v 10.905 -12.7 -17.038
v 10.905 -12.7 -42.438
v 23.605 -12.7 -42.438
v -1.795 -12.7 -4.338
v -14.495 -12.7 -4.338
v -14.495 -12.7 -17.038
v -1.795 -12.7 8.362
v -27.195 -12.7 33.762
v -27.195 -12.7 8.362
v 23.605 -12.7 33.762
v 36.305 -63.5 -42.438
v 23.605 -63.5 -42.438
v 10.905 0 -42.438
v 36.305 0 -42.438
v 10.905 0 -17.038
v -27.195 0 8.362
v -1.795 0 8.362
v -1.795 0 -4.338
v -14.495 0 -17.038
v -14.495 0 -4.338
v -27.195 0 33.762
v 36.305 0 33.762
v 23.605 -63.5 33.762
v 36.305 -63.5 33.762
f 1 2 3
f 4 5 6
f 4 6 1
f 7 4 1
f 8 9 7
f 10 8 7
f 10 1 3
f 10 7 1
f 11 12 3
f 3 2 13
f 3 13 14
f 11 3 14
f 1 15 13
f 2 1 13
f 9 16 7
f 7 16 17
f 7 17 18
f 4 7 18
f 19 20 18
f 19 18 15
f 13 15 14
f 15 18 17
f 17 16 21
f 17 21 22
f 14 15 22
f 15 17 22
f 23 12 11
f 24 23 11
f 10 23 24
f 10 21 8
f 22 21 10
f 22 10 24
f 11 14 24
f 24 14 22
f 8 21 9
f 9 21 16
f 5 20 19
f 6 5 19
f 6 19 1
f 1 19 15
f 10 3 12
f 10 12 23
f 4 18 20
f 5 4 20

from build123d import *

# Parameters (mm, degrees)
F1_DEPTH = 12.7
F2_W     = 12.7
F2_H     = 76.2
F3_DEPTH = 50.8


with BuildPart() as f1:
    # F0 (on Front) → F1 (new body)
    with BuildSketch(Plane.XZ):
        Polygon((36.304801, 33.762489), (-27.195199, 33.762489), (-27.195199, 8.362489), (-1.795199, 8.362489), (-1.795199, -4.337511), (-14.495199, -4.337511), (-14.495199, -17.037511), (10.904801, -17.037511), (10.904801, -42.437511), (36.304801, -42.437511), align=None)
    extrude(amount=F1_DEPTH)

    # F2 (on face) → F3 (join)
    with BuildSketch(Plane.XZ.offset(12.7)):
        with Locations((29.954801, -4.337511)):
            Rectangle(F2_W, F2_H)
    extrude(amount=F3_DEPTH)


solid = f1.part
